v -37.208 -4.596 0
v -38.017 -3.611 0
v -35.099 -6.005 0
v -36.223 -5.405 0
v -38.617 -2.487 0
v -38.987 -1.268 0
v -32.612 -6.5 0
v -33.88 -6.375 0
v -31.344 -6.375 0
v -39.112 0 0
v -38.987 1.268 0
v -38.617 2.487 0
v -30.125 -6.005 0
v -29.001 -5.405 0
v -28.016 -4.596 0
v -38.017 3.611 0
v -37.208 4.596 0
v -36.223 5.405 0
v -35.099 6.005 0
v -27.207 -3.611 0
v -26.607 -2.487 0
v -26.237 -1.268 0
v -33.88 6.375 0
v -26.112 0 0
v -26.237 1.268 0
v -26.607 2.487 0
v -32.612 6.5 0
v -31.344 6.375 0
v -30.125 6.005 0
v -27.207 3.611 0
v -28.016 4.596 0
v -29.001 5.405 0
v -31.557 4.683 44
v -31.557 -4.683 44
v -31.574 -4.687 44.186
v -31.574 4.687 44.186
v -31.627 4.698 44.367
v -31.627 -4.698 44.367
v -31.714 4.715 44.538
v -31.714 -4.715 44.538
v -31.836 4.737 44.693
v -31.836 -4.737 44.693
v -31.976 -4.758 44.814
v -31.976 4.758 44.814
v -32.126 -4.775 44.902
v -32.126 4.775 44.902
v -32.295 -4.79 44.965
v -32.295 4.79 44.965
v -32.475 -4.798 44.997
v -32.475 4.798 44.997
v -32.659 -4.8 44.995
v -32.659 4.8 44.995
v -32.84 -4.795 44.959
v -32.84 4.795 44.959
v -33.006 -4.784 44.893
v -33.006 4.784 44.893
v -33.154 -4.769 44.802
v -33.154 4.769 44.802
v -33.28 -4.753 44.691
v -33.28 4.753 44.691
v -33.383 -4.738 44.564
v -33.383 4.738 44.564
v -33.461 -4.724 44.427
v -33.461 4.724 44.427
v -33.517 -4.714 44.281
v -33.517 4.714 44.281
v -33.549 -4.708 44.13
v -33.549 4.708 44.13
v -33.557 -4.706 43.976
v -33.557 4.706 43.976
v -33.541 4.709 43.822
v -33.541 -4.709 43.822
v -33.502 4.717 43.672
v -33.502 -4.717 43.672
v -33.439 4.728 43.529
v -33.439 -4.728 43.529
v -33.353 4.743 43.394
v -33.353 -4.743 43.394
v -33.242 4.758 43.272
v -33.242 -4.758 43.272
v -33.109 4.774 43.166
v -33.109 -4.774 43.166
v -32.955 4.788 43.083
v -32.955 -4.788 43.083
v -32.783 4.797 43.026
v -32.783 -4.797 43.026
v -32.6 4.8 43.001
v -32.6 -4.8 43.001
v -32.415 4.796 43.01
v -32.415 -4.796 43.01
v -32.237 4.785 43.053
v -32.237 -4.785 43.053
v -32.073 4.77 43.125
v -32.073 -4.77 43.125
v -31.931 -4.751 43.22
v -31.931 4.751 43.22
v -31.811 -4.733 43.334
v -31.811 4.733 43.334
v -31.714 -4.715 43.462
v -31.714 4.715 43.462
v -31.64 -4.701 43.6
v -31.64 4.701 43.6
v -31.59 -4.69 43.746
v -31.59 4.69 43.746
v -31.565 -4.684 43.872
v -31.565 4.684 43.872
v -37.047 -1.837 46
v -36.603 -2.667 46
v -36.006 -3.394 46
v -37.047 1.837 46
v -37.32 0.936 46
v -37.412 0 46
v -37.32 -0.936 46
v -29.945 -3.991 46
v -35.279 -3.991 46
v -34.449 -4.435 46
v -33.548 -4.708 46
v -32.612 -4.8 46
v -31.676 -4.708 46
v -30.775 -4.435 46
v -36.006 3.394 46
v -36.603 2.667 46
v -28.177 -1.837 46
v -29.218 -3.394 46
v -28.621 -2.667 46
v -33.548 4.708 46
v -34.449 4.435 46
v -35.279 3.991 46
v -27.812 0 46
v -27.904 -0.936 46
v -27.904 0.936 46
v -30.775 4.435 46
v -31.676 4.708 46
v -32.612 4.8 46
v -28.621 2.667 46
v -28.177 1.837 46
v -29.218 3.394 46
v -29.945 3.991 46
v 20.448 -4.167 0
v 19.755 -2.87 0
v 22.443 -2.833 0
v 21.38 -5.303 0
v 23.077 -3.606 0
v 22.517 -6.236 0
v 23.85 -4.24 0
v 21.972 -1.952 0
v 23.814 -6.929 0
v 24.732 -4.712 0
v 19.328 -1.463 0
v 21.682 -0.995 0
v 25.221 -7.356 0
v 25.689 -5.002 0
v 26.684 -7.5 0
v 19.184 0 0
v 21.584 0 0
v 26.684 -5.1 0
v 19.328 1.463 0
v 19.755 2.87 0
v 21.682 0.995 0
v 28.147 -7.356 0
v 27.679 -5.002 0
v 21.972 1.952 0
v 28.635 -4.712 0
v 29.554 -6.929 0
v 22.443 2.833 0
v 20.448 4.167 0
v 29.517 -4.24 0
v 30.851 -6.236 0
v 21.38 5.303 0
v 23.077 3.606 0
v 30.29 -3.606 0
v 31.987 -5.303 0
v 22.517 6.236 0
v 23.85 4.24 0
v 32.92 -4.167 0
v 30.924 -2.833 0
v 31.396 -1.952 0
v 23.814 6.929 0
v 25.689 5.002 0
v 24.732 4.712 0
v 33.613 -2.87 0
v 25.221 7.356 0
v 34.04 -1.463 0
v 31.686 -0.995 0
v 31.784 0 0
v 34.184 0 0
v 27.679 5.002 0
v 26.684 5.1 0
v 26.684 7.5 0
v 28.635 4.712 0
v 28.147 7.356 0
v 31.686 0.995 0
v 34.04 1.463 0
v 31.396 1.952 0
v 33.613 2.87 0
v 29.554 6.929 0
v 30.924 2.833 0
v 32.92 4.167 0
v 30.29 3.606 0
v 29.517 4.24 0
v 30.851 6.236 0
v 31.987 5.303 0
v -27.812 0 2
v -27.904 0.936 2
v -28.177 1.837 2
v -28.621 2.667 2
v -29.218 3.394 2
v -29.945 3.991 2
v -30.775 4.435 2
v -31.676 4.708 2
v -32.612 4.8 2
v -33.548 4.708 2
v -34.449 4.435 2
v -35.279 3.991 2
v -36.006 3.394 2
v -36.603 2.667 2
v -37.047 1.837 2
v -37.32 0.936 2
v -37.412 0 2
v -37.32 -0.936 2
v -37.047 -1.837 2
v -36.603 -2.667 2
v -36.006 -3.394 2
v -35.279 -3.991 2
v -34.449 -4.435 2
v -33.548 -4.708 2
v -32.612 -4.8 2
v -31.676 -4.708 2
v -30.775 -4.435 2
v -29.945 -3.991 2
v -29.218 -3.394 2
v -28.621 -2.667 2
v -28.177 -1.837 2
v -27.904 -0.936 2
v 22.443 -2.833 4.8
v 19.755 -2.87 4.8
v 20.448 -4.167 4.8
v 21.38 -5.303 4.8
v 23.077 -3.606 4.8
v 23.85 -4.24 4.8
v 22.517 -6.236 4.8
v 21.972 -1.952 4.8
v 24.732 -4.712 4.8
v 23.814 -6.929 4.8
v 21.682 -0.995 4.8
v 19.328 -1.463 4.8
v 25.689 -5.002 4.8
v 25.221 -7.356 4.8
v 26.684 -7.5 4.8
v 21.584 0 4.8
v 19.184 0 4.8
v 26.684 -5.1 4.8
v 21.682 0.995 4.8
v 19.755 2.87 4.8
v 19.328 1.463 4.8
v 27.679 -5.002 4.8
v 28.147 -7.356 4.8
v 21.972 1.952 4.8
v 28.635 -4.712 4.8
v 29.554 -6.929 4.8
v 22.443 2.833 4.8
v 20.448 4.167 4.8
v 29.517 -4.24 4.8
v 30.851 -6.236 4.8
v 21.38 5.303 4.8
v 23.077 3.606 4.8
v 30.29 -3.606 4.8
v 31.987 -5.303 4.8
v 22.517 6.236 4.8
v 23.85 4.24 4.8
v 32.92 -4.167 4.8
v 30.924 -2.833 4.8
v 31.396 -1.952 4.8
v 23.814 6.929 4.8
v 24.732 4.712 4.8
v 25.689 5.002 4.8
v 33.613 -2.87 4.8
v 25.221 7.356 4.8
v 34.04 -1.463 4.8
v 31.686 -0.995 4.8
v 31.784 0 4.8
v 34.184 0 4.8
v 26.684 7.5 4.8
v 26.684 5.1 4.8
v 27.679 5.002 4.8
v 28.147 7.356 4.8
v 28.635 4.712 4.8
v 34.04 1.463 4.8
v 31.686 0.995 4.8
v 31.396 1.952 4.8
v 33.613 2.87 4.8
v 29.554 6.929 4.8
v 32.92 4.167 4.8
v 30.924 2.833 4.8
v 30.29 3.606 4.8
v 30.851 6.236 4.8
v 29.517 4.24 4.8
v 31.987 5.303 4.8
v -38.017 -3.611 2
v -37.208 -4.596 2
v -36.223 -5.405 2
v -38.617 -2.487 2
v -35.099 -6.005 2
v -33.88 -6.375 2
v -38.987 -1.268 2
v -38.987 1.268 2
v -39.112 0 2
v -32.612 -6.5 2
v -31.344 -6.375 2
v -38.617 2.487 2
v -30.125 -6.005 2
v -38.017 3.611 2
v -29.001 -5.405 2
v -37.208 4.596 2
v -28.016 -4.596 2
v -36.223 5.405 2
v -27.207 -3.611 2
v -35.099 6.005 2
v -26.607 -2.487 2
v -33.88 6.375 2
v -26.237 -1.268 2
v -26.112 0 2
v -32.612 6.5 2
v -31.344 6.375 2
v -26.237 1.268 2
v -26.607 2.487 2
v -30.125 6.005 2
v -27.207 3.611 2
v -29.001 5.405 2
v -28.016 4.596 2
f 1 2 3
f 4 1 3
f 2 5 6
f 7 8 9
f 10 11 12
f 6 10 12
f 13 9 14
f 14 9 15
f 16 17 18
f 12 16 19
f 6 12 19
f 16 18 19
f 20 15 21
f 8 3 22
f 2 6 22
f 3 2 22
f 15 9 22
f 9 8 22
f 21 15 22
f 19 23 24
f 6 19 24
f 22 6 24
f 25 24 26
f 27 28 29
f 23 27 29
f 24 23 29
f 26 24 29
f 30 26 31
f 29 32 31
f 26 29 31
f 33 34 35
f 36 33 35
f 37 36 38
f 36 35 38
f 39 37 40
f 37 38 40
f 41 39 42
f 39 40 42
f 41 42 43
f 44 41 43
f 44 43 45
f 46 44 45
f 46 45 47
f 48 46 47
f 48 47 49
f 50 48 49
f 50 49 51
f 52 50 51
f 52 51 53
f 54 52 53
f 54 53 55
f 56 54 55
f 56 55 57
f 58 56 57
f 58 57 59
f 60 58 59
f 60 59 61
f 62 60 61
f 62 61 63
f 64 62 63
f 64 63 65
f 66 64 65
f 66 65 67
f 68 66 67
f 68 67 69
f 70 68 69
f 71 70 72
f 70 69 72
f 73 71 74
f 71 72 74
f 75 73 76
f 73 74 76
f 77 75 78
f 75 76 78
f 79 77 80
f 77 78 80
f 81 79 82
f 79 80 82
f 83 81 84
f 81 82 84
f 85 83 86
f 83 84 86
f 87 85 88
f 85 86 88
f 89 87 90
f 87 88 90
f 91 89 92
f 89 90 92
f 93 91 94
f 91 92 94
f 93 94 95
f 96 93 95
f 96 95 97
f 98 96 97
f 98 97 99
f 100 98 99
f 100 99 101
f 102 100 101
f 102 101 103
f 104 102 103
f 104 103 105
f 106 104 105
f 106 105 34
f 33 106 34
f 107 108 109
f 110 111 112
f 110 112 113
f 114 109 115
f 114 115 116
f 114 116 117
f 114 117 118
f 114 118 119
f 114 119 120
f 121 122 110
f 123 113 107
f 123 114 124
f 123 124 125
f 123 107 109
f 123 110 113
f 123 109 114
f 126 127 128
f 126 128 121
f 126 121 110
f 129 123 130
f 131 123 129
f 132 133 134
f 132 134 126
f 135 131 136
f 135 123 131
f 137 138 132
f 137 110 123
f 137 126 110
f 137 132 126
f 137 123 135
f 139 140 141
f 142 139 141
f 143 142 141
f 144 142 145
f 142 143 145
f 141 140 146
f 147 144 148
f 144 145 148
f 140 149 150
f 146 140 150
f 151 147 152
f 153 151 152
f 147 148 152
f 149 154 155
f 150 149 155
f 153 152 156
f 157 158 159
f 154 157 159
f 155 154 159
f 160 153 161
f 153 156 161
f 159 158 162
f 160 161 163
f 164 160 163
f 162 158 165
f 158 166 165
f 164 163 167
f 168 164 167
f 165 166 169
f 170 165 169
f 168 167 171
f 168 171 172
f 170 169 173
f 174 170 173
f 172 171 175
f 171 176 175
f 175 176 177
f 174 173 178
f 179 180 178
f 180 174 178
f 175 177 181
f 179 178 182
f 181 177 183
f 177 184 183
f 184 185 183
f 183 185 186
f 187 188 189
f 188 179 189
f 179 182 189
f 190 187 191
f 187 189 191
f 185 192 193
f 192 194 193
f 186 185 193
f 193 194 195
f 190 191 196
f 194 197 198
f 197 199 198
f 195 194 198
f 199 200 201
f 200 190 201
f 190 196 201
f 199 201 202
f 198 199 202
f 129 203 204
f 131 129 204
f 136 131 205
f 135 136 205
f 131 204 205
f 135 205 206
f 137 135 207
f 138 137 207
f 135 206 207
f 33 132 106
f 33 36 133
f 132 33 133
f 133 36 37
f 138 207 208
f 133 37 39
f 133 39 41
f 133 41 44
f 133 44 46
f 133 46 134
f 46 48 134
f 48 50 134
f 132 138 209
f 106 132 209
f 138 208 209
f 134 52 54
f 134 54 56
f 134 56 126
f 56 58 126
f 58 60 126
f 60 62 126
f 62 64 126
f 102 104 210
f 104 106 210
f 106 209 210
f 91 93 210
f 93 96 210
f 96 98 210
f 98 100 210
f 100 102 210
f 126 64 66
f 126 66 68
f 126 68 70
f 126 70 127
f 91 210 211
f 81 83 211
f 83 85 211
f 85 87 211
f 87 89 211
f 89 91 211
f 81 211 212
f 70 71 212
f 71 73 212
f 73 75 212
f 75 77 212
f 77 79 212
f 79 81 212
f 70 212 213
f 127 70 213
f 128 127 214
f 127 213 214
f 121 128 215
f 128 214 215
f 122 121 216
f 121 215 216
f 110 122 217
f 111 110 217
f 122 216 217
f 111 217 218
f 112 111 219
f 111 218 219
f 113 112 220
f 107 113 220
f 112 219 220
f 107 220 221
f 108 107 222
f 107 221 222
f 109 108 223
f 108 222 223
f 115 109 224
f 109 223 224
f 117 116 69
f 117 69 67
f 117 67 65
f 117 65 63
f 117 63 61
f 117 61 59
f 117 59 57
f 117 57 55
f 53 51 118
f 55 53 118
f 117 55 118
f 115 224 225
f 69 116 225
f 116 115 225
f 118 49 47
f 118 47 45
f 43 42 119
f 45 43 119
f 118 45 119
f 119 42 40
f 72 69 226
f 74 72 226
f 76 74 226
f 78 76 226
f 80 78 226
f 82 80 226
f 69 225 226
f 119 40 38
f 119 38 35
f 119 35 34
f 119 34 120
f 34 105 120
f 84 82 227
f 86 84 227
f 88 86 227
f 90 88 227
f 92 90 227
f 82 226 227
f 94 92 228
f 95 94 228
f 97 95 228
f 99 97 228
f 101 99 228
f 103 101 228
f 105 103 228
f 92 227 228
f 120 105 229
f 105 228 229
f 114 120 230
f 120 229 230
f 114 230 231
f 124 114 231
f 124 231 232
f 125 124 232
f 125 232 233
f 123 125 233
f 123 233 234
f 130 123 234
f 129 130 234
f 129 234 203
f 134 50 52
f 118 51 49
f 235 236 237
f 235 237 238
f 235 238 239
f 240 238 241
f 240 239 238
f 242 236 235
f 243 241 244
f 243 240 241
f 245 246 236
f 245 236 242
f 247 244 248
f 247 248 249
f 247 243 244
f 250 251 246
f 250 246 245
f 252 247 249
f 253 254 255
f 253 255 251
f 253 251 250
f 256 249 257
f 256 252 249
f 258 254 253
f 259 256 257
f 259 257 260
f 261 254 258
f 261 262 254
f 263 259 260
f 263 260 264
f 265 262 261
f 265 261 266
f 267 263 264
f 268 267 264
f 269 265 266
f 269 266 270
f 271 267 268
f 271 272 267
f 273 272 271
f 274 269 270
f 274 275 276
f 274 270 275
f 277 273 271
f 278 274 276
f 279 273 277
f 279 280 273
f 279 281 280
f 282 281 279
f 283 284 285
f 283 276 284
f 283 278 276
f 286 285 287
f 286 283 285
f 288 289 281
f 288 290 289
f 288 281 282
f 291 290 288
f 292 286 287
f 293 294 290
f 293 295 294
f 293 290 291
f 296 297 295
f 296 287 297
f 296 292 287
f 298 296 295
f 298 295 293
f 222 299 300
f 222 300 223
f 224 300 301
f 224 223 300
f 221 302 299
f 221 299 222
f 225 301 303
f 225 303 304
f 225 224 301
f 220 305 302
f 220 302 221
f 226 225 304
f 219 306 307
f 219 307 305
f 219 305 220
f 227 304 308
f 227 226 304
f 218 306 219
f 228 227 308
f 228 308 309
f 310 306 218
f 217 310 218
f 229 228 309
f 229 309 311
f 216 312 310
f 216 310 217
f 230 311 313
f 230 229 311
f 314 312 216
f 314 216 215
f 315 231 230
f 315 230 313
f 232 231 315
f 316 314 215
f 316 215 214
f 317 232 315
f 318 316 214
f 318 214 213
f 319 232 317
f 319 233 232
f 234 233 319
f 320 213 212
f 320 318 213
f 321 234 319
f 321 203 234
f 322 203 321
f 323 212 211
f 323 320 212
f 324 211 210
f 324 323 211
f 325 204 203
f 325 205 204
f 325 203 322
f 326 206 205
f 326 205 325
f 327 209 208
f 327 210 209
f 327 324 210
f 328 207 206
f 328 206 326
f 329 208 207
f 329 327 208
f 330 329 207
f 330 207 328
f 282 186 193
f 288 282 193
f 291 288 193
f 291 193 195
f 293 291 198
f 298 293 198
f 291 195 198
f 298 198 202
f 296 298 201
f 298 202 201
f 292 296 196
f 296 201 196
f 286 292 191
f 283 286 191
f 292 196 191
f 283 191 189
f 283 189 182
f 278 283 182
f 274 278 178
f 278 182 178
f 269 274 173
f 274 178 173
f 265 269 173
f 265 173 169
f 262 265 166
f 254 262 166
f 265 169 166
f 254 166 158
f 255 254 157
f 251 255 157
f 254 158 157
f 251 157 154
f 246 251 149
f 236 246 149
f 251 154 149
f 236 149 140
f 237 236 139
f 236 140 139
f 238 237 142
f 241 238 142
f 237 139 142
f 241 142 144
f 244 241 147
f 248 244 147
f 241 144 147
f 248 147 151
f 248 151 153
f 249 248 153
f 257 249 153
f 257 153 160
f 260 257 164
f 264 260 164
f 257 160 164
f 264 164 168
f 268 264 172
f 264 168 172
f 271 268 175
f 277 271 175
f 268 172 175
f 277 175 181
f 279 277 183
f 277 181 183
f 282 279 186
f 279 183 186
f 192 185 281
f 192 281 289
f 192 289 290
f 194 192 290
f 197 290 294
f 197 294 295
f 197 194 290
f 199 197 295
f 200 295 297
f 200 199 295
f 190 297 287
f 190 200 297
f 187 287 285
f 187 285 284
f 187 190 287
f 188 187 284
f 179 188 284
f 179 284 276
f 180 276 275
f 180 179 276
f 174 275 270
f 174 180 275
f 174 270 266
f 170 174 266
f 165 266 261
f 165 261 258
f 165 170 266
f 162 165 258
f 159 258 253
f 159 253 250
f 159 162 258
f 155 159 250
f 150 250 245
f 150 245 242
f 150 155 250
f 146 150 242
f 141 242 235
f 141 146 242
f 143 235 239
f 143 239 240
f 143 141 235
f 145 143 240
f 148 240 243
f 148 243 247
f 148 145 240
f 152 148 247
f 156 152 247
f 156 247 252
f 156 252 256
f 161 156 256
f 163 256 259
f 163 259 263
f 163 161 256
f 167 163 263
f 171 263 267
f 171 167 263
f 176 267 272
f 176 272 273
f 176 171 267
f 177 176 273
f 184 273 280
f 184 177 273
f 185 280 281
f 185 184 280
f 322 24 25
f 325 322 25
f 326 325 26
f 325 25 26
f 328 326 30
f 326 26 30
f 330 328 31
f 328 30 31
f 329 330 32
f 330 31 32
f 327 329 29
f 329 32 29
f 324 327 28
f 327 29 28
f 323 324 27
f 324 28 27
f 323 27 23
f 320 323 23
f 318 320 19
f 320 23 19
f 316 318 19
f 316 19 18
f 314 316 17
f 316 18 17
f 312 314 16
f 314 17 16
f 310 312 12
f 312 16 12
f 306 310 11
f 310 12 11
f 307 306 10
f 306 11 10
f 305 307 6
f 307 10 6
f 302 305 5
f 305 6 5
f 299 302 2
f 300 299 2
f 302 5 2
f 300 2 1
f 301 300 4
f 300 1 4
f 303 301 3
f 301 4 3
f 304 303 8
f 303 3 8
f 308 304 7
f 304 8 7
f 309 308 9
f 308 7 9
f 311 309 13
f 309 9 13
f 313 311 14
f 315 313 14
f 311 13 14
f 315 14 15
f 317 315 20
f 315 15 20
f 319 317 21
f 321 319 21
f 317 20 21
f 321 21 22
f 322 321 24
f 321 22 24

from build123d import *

# Parameters (mm, degrees)
F0_R     = 7.5
F0_R_2   = 5.1
F1_DEPTH = 4.8
F2_R     = 6.5
F3_DEPTH = 2
F4_R     = 4.8
F5_DEPTH = 44
F7_R     = 1
F8_DEPTH = 63


with BuildPart() as f1:
    # F0 (on Top) → F1 (new body)
    with BuildSketch(Plane.XY):
        with Locations((26.683733, 0)):
            Circle(F0_R)
        with Locations((26.683733, 0)):
            Circle(F0_R_2, mode=Mode.SUBTRACT)
    extrude(amount=F1_DEPTH)


with BuildPart() as f3:
    # F2 (on Top) → F3 (new body)
    with BuildSketch(Plane.XY):
        with Locations((-32.611998, 0)):
            Circle(F2_R)
    extrude(amount=F3_DEPTH)

    # F4 (on face) → F5 (join)
    with BuildSketch(Plane.XY.offset(2)):
        with Locations((-32.611998, 0)):
            Circle(F4_R)
    extrude(amount=F5_DEPTH)

    # F7 (on offset) → F8 (cut)
    with BuildSketch(Plane.XZ.offset(10)):
        with Locations((-32.557048, 44)):
            Circle(F7_R)
    extrude(amount=-F8_DEPTH, mode=Mode.SUBTRACT)


solid = Compound([f1.part, f3.part])
